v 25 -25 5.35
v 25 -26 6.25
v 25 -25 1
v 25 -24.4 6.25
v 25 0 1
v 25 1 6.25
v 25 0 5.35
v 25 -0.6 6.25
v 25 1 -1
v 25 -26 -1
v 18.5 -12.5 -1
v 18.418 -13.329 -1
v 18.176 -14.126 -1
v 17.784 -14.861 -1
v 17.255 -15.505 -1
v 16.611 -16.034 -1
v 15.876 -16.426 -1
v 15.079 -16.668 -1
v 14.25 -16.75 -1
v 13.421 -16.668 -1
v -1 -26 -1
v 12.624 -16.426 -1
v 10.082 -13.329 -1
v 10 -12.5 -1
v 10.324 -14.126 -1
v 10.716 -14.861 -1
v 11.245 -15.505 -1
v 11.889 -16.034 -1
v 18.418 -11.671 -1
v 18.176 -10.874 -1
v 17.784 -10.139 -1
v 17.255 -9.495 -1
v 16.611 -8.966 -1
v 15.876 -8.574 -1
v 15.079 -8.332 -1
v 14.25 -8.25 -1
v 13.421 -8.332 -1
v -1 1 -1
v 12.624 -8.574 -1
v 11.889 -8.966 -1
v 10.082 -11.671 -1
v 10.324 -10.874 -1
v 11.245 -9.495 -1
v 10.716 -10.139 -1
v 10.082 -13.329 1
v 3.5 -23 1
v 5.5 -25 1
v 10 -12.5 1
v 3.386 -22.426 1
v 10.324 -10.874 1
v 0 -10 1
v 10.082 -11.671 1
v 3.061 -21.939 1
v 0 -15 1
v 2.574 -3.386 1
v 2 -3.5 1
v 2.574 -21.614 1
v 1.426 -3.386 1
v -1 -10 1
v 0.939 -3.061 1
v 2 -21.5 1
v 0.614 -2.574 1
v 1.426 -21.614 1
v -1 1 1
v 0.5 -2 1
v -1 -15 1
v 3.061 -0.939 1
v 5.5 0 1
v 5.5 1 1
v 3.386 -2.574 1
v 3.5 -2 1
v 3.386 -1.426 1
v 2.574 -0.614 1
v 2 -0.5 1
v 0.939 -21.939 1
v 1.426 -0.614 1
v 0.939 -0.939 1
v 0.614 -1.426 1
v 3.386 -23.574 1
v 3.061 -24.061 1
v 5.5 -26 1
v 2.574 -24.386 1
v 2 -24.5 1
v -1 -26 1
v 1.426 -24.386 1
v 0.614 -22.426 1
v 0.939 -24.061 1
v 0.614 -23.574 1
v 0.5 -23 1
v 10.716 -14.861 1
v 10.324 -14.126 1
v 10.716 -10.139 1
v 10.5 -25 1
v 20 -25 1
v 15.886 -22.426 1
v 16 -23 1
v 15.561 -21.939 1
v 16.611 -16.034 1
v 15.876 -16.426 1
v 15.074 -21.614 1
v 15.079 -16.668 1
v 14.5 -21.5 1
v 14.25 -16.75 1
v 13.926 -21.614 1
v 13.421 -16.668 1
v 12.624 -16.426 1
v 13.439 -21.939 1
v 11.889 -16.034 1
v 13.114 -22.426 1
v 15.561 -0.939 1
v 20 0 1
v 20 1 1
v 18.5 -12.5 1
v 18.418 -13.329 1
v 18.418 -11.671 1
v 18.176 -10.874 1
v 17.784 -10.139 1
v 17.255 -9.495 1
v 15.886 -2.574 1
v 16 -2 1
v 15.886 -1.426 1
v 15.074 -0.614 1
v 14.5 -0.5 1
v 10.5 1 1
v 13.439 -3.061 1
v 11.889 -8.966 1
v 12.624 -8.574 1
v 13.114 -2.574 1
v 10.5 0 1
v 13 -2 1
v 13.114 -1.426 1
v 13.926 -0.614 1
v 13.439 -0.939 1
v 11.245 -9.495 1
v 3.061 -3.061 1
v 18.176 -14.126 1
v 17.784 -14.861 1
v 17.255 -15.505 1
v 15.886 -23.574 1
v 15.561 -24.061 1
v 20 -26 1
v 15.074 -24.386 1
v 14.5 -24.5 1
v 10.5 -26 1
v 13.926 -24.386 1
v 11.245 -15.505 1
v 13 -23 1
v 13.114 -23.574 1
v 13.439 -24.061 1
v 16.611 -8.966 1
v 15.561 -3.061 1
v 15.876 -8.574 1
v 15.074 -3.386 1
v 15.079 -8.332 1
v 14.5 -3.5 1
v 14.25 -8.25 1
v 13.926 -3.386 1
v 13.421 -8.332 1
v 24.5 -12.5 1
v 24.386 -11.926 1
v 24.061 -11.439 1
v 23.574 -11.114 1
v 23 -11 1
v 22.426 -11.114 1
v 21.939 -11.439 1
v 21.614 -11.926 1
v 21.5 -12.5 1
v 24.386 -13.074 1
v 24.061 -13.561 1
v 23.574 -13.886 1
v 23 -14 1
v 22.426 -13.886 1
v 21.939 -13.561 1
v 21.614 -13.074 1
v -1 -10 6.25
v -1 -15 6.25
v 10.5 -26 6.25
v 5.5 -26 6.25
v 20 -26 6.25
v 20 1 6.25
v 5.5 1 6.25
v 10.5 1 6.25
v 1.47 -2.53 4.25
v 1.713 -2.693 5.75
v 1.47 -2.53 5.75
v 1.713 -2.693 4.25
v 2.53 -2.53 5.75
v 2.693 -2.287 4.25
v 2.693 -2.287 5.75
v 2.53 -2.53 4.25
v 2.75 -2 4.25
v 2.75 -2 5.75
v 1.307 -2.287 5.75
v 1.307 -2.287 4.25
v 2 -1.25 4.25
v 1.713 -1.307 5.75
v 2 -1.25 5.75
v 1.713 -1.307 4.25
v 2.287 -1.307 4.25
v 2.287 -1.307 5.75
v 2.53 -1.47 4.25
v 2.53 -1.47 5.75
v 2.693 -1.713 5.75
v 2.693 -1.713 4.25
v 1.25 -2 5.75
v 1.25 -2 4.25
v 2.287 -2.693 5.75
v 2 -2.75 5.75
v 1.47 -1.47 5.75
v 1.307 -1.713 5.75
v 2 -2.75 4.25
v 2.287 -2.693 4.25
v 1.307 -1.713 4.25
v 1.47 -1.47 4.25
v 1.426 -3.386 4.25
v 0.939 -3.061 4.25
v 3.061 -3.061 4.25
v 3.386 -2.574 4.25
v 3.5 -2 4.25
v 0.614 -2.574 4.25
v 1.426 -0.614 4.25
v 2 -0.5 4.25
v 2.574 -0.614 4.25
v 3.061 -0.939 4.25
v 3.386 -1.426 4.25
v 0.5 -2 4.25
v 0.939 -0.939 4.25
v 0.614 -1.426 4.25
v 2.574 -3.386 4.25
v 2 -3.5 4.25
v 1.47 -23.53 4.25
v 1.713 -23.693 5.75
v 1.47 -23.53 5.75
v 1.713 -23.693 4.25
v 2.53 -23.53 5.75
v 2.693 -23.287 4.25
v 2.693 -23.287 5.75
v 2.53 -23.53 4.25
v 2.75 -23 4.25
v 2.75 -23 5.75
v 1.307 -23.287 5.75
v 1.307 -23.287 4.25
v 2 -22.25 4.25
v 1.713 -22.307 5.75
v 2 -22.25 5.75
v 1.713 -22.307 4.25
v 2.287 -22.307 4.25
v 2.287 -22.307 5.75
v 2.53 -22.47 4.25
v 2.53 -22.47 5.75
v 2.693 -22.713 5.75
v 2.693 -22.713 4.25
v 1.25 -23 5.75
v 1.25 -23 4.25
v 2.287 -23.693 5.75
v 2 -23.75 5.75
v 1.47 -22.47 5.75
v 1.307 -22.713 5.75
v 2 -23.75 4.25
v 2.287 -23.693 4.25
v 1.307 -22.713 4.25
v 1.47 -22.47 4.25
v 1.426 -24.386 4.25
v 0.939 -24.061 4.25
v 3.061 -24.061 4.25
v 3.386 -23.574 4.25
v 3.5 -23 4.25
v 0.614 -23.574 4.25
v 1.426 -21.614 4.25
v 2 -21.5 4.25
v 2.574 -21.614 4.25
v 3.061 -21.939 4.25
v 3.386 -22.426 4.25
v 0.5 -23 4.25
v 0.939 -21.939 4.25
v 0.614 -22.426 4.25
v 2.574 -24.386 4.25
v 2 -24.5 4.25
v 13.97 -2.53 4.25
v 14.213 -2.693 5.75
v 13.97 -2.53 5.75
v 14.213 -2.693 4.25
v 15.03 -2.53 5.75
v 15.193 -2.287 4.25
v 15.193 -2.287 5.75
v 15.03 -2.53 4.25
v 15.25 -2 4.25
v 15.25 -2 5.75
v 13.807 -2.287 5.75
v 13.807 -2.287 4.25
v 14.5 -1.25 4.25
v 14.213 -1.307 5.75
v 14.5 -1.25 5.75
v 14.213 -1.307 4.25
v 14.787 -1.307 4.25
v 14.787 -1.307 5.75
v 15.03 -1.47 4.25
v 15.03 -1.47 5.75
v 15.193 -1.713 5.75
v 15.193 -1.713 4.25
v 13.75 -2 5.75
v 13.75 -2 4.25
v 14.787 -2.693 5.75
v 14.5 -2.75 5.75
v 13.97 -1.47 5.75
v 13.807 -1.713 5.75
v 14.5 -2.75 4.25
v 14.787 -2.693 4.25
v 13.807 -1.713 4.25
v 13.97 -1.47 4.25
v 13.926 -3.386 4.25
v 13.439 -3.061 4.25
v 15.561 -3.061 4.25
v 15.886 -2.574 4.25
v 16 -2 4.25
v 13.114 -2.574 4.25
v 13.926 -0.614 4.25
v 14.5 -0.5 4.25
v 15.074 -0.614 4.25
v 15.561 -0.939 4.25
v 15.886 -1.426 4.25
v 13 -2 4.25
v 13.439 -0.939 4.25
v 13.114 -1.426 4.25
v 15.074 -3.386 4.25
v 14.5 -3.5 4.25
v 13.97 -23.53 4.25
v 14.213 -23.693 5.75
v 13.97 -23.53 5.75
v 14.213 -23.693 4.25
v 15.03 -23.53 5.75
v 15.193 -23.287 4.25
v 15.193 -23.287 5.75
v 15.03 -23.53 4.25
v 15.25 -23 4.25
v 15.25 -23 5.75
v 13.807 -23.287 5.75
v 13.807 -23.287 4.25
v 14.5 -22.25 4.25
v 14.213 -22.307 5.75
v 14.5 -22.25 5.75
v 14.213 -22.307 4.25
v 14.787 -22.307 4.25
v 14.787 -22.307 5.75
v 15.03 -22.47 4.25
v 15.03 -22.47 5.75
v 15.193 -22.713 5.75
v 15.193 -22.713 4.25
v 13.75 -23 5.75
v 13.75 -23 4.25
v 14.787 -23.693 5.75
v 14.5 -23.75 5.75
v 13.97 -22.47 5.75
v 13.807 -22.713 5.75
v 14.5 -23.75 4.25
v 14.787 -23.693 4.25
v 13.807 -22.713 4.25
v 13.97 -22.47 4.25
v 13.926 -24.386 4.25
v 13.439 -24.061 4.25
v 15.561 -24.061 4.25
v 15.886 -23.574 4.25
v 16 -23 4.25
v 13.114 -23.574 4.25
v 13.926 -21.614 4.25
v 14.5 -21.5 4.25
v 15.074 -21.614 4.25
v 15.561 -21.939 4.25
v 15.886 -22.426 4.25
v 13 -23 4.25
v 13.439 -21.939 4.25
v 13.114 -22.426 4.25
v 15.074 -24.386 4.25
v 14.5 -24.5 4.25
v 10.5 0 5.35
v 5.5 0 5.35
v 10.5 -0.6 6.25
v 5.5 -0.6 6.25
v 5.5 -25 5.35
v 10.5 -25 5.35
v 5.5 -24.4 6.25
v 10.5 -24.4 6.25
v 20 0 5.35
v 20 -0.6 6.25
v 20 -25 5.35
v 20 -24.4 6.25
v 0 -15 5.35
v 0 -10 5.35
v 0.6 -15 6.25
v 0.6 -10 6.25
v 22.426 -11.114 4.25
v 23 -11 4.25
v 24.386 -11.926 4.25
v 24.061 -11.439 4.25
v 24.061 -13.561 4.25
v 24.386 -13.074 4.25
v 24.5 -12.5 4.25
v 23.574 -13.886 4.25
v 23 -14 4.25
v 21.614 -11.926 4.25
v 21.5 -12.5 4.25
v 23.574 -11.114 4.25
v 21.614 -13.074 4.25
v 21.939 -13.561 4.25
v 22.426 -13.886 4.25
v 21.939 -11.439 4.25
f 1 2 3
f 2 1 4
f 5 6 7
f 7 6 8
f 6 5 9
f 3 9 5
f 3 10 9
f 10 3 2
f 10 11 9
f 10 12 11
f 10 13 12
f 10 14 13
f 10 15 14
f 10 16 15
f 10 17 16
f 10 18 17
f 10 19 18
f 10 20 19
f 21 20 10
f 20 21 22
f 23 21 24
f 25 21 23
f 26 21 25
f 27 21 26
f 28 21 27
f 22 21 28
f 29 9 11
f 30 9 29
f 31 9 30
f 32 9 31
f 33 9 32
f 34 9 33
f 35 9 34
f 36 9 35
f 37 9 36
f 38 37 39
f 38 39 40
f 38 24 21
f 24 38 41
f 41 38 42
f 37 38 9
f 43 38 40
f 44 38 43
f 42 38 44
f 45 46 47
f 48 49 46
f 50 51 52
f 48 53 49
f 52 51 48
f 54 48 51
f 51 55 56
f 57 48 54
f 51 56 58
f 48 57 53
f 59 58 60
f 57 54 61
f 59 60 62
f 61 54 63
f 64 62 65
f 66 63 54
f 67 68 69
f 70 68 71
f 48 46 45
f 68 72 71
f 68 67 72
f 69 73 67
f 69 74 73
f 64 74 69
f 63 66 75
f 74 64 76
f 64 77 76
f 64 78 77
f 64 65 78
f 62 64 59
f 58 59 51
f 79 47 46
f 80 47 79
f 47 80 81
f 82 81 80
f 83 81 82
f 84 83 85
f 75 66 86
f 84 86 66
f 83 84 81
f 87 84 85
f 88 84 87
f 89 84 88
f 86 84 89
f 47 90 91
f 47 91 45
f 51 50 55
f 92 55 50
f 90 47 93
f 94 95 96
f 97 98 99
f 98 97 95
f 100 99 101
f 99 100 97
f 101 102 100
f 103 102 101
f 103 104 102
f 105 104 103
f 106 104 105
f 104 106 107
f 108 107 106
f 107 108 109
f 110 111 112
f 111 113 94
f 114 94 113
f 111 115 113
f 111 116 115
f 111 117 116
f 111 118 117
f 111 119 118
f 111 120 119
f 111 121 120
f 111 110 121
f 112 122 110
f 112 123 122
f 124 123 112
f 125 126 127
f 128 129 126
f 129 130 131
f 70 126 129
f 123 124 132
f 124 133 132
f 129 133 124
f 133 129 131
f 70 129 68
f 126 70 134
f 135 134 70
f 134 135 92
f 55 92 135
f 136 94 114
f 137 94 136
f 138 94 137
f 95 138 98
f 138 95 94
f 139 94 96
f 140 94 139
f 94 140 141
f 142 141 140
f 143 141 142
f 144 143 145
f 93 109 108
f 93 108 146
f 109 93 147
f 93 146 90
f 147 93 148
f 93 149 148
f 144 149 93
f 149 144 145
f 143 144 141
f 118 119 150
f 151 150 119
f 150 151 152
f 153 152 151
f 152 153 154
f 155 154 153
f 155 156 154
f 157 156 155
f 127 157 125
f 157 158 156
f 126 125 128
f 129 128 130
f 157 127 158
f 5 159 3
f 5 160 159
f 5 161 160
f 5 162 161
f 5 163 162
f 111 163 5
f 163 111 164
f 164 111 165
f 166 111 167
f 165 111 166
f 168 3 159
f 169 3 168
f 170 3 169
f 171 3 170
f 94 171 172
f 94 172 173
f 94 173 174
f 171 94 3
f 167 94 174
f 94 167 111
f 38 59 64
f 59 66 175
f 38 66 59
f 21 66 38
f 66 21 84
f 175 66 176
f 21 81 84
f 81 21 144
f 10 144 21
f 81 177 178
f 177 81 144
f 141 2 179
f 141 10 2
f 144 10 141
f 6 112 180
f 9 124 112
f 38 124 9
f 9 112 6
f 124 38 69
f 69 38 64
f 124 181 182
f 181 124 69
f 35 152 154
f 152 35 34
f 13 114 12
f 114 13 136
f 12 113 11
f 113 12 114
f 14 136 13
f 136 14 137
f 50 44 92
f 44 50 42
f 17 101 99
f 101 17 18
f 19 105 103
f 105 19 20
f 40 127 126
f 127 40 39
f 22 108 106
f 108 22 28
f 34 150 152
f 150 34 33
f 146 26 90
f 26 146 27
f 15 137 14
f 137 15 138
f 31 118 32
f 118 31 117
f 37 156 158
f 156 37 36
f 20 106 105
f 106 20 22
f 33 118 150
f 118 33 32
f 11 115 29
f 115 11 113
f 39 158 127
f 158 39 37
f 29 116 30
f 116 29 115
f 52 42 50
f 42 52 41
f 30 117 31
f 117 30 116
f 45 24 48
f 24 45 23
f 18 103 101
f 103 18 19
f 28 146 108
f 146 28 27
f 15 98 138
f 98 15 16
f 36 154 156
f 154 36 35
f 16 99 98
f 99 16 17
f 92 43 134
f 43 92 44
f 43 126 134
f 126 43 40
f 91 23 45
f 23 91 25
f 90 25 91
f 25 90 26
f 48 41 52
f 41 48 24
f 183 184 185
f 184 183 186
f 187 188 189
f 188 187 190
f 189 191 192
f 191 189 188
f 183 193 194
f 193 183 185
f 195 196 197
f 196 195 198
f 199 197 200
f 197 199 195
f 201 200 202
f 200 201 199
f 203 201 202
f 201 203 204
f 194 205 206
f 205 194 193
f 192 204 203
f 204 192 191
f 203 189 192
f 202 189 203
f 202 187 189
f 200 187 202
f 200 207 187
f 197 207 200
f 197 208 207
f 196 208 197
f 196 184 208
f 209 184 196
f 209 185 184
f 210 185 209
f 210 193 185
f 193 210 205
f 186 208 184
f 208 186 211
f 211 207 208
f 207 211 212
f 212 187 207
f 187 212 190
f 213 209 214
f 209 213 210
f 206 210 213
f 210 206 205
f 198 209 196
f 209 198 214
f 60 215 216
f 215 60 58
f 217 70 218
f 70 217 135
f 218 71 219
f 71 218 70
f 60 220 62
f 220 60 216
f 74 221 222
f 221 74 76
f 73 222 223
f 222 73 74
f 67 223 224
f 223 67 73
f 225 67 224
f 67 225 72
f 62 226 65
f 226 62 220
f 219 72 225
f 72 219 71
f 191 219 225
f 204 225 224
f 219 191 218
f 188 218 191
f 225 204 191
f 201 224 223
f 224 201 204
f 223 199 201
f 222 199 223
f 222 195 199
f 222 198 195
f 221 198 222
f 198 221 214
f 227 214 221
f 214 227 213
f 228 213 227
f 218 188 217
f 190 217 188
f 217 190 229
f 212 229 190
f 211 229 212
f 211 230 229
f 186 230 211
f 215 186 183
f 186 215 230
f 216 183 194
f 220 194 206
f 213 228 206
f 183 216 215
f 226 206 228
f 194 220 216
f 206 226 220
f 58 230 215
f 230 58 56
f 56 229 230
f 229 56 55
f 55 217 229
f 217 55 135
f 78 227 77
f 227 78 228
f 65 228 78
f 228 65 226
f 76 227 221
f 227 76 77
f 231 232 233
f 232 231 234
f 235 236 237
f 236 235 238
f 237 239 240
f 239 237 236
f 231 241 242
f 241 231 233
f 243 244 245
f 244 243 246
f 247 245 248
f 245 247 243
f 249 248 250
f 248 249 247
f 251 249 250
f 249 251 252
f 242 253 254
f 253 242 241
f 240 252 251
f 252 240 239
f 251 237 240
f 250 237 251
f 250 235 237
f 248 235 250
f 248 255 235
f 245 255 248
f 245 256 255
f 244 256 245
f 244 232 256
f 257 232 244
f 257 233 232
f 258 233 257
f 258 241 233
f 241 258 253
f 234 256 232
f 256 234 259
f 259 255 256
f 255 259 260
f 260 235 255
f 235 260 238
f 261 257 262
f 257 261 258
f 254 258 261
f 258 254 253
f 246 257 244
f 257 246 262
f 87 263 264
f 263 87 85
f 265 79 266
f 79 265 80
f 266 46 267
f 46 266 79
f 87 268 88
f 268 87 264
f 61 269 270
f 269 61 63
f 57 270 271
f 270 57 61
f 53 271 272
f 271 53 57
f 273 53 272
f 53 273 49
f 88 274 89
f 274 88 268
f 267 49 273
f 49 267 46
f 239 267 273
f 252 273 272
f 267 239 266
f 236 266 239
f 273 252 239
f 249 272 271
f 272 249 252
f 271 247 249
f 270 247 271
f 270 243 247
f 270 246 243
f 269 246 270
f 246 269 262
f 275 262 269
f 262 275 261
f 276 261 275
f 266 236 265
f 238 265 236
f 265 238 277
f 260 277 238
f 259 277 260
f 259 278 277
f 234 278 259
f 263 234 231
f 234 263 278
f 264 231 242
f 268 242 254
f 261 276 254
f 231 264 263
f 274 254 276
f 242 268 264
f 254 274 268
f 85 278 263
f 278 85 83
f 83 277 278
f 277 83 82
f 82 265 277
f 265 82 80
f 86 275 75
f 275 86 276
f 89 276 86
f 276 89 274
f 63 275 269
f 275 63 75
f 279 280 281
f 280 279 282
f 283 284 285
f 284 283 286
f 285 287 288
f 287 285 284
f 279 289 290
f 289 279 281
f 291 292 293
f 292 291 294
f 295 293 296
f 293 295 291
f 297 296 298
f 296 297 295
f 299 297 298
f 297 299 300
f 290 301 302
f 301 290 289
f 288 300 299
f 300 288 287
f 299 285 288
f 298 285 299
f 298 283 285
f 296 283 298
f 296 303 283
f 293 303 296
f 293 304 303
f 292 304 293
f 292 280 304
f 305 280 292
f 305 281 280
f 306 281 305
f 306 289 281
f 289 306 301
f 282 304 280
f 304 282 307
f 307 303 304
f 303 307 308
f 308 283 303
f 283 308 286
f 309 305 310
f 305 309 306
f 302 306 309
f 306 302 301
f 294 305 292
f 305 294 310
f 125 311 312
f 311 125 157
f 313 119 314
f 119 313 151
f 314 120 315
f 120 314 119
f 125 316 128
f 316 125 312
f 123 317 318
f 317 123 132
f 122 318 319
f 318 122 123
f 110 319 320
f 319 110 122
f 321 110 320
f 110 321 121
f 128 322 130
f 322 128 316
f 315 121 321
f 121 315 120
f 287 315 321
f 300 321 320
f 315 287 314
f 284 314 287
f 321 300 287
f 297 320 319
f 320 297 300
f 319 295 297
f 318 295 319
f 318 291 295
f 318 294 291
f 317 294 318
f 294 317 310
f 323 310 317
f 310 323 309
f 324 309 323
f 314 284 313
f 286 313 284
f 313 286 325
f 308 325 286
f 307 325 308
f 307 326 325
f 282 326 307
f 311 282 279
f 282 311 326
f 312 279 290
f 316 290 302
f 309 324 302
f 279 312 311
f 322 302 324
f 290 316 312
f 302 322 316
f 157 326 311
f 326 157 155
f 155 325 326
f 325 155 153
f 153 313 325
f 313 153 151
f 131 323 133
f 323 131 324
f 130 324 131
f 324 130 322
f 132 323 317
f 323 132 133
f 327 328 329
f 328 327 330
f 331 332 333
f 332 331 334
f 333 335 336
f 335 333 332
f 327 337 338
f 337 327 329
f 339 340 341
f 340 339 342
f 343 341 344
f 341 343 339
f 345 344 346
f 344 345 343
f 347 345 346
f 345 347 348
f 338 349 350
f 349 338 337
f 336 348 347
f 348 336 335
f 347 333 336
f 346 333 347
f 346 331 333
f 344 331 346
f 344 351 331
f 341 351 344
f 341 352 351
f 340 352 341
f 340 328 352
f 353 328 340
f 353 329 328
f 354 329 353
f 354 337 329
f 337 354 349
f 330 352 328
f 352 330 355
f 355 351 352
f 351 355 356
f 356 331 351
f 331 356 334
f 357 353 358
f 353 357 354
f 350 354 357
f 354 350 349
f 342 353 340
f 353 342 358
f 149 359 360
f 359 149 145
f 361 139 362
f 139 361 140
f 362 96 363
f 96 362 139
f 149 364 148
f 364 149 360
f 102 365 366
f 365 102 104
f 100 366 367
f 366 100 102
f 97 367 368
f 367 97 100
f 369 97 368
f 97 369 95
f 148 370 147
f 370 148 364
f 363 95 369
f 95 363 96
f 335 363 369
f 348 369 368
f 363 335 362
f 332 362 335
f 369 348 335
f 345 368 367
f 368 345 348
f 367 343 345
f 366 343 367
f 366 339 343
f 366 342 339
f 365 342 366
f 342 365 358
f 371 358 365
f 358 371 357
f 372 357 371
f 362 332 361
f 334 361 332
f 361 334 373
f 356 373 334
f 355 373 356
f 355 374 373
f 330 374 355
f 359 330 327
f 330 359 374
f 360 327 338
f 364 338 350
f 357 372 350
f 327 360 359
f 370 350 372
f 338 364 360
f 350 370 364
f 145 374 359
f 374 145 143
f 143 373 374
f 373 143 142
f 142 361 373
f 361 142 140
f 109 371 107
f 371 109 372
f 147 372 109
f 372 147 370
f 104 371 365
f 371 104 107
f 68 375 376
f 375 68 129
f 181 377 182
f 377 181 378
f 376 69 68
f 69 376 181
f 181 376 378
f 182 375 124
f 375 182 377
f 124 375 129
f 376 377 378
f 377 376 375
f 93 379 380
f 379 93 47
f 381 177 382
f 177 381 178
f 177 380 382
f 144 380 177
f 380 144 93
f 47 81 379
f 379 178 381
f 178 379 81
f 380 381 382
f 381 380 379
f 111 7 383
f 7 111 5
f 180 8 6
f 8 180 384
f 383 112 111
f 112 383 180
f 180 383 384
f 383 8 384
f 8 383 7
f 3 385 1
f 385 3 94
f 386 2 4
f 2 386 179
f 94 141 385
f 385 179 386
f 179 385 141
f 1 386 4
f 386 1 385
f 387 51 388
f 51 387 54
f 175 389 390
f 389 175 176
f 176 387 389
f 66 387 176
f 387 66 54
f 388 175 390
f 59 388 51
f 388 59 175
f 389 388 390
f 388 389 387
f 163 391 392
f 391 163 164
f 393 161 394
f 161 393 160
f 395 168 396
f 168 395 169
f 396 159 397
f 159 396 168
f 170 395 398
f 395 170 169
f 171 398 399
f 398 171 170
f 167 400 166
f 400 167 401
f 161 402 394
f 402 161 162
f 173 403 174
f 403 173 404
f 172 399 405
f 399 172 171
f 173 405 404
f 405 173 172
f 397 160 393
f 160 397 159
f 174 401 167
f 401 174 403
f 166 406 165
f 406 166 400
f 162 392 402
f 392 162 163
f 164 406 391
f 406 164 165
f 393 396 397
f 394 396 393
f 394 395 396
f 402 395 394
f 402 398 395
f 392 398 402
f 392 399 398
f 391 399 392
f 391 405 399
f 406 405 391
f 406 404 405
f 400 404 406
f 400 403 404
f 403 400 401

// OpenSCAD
// Raspberry Pi Camera - OpenSCAD
//
// https://github.com/larsch/openscad-modules/blob/master/rpi-camera.scad
//
// License: CC BY-SA 2.0
// https://creativecommons.org/licenses/by-sa/2.0/legalcode
//
// This case was designed for the Rasperry Pi 1 Model B, because that
// the one i had lying around for this project. I power it via the pin
// header 5V pin using a DC-DC buck converter and an external 9V DC
// power supply. The camera ribbon cable is slighly skewed inside the
// case, because I wanted the case to be small and it doesn't line up
// well.

fn_mounts = 16;
fn_camera = 32;

pcb_height = 1;

wall_thickness = 2;

pcb_guide_diameter = 1.5;
pcb_guide_height = pcb_height+.5;
camera_height = 3.25;
lens_hole_diameter = 8.5;

module rpi_camera() {
     color("darkblue")
	  difference() {
          cube([24,25,1]);
          translate([2,2,-1]) cylinder(d=2,h=3,$fn=fn_mounts);
          translate([2,23,-1]) cylinder(d=2,h=3,$fn=fn_mounts);
          translate([14.5,2,-1]) cylinder(d=2,h=3,$fn=fn_mounts);
          translate([14.5,23,-1]) cylinder(d=2,h=3,$fn=fn_mounts);
     }
     color("DimGray") union() {
          translate([10.25,8.5,1]) cube([8,8,3.25]);
          translate([10.25+4,12.5,1+3.25]) cylinder(d=7.5,h=1,$fn=fn_camera);
          translate([10.25+4,12.5,1+3.25+0.7]) cylinder(d=5.5,h=0.7,$fn=fn_camera);
     }
     color("orange") translate([1.75,8.625,1]) cube([8.5,7.75,1.5]);
     color("brown") translate([24-5.75,2.75,-2.75]) cube([4.5,19.5,2.75]);
     color("black") translate([22.75,2,-2.75]) cube([1.25,21,2.75]);
     color("grey") translate([24,4.25,-1]) cube([10,16.5,0.1]);
}

module pcb_guide(diameter, height) {
    translate([0, 0, -height])
        cylinder(d=diameter,h=3,$fn=fn_mounts);
    translate([0, 0, 0])
        cylinder(d=diameter*2,h=camera_height,$fn=fn_mounts);
}

module prism(l, w, h){
       polyhedron(
               points=[[0,0,0], [l,0,0], [l,w,0], [0,w,0], [0,w,h], [l,w,h]],
               faces=[[0,1,2,3],[5,4,3,2],[0,4,5,1],[0,3,4],[5,2,1]]
               );  
       }
   
module pcb_clip(width, height, thickness) {
    union() {
    cube([thickness, width, height]);
    wedge=1.6*thickness;
    rotate([0, 0, 90]) translate([0,-wedge,0]) prism(width,wedge,1.5*wedge);
    }
}

module rpi_camera_mount() {
    color("lightblue") {
        thickness = 1;
        translate([-thickness, -thickness, camera_height]) {
            difference() {
                cube([24+2*thickness,25+2*thickness,wall_thickness]);
                translate([10.25+4+thickness,12.5+thickness,-4])
                    cylinder(d=lens_hole_diameter,h=10,$fn=fn_camera);
            }
        }
        translate([2,2,0]) pcb_guide(pcb_guide_diameter, pcb_guide_height);
        translate([2,23,0]) pcb_guide(pcb_guide_diameter, pcb_guide_height);
        translate([14.5,2,0]) pcb_guide(pcb_guide_diameter, pcb_guide_height);
        translate([14.5,23,0]) pcb_guide(pcb_guide_diameter, pcb_guide_height);
        translate([23,12.5,0]) cylinder(d=2*pcb_guide_diameter, camera_height, $fn=fn_mounts);
         height = camera_height+pcb_height+1;
        translate([10.5, -thickness, camera_height-height]) rotate([0, 0, 90])
            pcb_clip(5, height, thickness);
        translate([10.5-5, 25+thickness, camera_height-height]) rotate([0,0,-90])
            pcb_clip(5, height, thickness);
        translate([25, -thickness, camera_height-height]) rotate([0, 0, 90])
            pcb_clip(5, height, thickness);
        translate([25-5, 25+thickness, camera_height-height]) rotate([0,0,-90])
            pcb_clip(5, height, thickness);
        translate([-1, 10, camera_height-height])
            pcb_clip(5, height, thickness);

    }

}

{
//  translate([0,0,-pcb_height]) rpi_camera();
    translate([0,0,01*(camera_height+pcb_height)])
        rotate([180,0,0])
        rpi_camera_mount();


}
